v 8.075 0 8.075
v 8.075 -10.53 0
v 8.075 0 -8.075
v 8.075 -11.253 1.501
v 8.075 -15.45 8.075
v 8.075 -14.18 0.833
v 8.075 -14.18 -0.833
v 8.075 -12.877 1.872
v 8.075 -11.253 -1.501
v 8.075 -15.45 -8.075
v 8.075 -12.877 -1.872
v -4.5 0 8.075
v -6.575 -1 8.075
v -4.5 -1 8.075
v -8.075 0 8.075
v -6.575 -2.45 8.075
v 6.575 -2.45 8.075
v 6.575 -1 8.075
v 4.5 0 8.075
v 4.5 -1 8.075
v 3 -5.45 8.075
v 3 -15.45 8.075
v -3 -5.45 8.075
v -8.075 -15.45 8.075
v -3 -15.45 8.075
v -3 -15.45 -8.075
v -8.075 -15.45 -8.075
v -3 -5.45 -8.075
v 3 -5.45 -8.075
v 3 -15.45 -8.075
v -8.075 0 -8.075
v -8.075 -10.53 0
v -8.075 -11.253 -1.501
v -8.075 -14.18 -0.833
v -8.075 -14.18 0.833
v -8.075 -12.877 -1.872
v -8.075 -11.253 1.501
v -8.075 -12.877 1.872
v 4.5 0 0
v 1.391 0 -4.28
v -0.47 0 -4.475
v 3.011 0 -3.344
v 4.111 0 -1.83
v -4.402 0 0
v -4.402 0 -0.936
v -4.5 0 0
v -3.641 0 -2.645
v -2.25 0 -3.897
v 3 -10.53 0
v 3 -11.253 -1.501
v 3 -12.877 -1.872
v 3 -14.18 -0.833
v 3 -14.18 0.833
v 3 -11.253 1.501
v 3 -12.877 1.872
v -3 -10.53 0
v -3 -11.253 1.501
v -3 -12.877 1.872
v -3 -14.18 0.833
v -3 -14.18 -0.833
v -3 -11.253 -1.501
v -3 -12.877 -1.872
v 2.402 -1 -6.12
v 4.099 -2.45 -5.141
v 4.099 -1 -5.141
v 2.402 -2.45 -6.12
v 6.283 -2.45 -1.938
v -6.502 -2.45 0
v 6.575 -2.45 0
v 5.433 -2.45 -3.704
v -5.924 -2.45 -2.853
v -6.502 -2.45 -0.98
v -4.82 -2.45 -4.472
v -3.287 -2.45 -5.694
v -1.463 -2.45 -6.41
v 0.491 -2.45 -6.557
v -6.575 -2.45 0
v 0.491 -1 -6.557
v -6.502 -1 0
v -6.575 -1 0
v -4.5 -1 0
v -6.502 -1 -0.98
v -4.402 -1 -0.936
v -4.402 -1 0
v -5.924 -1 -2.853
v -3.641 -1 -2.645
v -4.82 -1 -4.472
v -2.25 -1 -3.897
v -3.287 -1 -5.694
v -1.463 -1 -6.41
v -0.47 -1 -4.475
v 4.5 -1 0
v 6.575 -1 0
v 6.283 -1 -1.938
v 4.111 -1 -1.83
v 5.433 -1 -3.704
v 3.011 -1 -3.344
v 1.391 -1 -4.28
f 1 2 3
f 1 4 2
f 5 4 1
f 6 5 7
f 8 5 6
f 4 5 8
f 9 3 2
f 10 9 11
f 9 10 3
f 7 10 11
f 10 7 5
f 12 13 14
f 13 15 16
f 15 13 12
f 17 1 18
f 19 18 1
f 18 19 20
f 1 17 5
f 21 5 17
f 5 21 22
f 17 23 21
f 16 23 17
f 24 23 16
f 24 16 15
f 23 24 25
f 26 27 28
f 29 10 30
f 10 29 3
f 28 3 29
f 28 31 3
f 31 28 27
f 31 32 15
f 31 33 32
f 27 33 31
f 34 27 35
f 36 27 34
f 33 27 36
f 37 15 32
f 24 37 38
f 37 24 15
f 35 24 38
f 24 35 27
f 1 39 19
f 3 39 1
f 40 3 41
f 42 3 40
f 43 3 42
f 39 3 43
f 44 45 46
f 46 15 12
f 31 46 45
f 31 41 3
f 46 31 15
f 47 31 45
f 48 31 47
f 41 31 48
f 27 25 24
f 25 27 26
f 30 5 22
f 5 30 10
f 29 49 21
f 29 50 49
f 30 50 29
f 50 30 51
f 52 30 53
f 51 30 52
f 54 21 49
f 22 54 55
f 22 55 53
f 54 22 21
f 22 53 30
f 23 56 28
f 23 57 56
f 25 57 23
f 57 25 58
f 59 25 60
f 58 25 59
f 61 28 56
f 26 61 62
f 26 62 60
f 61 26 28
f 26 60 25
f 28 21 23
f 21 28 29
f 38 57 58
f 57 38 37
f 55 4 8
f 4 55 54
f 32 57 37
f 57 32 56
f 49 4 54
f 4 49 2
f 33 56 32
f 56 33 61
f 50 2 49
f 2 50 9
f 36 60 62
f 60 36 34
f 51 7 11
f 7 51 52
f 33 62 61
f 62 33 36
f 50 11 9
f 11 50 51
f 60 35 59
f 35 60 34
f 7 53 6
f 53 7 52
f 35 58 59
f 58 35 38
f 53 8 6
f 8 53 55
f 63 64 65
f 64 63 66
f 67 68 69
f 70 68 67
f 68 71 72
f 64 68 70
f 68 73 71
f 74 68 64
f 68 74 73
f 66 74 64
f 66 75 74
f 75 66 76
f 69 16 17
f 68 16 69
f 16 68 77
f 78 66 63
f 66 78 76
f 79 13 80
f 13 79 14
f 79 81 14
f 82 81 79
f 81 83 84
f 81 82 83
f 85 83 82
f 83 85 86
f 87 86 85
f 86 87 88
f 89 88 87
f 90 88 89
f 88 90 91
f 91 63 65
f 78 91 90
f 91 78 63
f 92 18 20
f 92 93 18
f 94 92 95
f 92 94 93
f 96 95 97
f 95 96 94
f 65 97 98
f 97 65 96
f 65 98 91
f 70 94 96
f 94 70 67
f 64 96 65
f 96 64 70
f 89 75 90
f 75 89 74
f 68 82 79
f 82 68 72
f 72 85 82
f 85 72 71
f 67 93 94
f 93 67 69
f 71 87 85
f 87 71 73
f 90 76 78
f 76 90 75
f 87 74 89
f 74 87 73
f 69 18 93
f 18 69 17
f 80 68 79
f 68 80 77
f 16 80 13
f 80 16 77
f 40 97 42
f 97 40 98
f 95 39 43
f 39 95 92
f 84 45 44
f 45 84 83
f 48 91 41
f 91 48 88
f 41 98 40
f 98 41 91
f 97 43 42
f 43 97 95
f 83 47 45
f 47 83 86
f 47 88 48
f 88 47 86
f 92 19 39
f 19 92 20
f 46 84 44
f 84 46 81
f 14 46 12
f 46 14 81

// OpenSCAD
//Change to suit your system

///// 1cc DONE
//syringe_thickness_in = 1.6;
//syringe_diameter_in = 8.5;
//syringe_slots_diameter = 4;

///// 3cc DONE
syringe_thickness_in = 1.45;
syringe_diameter_in = 12.65;
syringe_slots_diameter = 9;

///// 10cc DONE
//syringe_thickness_in = 1.85;
//syringe_diameter_in = 16.65;
//syringe_slots_diameter = 11;

///// 60cc DONE
//syringe_thickness_in = 2.6;
//syringe_diameter_in = 30.5;
//syringe_slots_diameter = 19;



// Do not change
syringe_thickness = syringe_thickness_in;
syringe_diameter = syringe_diameter_in + 0.5;
hole_r = 2.64/2 + .6;
padding = 3;
syringe_lip = 1;
piston_rod_slot_l = 10;
piston_rod_slot_w = 6;

body_w = syringe_diameter+padding;
body_l = syringe_lip+syringe_thickness+padding+piston_rod_slot_l;
body_h = syringe_diameter+padding;


difference(){
    //Main body
    translate([0,-body_l/2,0])
    cube([body_w,body_l,body_h],center=true);
    
    // Piston_rod attachment slot
    translate([0,-body_l+piston_rod_slot_l/2,0])
    cube([piston_rod_slot_w,piston_rod_slot_l,body_h*2],center=true);
    
    // Piston_rod screw hole
    translate([-body_w,-body_l+3,0])
    rotate([90,0,90])
    cylinder(h=body_w*2,r=hole_r);
    
    
    // Inner circle
    translate([0,-syringe_lip,0])
    rotate([90,0,0])
    cylinder(h=syringe_thickness, r=syringe_diameter/2);
    
    // Inner Square extrusion
    translate([-syringe_diameter/2,-syringe_thickness-syringe_lip,0])
    cube([syringe_diameter,syringe_thickness,body_h/2]); 
    
    
    // Outer circle
    translate([0,0,0])
    rotate([90,0,0])
    cylinder(h=syringe_lip, r=syringe_slots_diameter/2);
    
    // Outer Square extrusion
    translate([-syringe_slots_diameter/2,-syringe_lip,0])
    cube([syringe_slots_diameter,syringe_lip,body_h/2]);     
}
